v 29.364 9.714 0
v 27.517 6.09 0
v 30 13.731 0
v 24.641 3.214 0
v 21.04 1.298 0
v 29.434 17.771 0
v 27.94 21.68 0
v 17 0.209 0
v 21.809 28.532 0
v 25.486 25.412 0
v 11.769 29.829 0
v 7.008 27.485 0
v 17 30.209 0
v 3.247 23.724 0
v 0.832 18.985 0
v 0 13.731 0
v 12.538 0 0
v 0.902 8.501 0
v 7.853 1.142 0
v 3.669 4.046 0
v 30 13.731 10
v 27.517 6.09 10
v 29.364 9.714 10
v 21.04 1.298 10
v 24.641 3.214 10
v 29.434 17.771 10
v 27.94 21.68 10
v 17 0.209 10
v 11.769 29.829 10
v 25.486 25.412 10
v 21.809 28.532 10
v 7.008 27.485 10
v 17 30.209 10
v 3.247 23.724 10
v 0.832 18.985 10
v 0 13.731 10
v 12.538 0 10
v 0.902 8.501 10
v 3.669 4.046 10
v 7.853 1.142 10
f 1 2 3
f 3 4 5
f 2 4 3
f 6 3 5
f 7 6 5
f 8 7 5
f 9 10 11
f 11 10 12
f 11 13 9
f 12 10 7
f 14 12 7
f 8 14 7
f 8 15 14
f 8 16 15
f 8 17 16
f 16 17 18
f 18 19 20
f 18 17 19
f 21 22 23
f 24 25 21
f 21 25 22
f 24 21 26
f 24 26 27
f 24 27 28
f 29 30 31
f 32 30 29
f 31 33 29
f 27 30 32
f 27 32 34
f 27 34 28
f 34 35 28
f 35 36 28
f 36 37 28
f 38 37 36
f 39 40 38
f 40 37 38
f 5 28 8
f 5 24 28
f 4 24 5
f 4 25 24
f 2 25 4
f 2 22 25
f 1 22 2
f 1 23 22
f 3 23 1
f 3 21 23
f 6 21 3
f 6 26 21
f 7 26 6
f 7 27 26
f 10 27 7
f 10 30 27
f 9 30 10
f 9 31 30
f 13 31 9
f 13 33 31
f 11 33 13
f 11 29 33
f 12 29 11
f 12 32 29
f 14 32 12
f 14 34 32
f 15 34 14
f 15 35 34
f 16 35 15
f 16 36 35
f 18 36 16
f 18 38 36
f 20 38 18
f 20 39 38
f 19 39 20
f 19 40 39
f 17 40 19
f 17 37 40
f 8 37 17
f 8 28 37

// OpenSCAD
$fn = 32;

// ----------------------------------------------------------------------
// Cam disc: base radius 13.0 mm, lift 4.0 mm, 20 profile points
// ----------------------------------------------------------------------

// --- parameters (mm) ---
profile_height = 10;      // extrusion height
profile_points = 20;      // points of the closed outline

profile = [[30, 13.731], [29.434, 17.771], [27.94, 21.68], [25.486, 25.412], [21.809, 28.532], [17, 30.209], [11.769, 29.829], [7.008, 27.485], [3.247, 23.724], [0.832, 18.985], [0, 13.731], [0.902, 8.501], [3.669, 4.046], [7.853, 1.142], [12.538, 0], [17, 0.209], [21.04, 1.298], [24.641, 3.214], [27.517, 6.09], [29.364, 9.714]];  // single closed polygon, 20 points, counter clockwise

// --- the one profile operation ---
linear_extrude(height = profile_height) polygon(points = profile);
